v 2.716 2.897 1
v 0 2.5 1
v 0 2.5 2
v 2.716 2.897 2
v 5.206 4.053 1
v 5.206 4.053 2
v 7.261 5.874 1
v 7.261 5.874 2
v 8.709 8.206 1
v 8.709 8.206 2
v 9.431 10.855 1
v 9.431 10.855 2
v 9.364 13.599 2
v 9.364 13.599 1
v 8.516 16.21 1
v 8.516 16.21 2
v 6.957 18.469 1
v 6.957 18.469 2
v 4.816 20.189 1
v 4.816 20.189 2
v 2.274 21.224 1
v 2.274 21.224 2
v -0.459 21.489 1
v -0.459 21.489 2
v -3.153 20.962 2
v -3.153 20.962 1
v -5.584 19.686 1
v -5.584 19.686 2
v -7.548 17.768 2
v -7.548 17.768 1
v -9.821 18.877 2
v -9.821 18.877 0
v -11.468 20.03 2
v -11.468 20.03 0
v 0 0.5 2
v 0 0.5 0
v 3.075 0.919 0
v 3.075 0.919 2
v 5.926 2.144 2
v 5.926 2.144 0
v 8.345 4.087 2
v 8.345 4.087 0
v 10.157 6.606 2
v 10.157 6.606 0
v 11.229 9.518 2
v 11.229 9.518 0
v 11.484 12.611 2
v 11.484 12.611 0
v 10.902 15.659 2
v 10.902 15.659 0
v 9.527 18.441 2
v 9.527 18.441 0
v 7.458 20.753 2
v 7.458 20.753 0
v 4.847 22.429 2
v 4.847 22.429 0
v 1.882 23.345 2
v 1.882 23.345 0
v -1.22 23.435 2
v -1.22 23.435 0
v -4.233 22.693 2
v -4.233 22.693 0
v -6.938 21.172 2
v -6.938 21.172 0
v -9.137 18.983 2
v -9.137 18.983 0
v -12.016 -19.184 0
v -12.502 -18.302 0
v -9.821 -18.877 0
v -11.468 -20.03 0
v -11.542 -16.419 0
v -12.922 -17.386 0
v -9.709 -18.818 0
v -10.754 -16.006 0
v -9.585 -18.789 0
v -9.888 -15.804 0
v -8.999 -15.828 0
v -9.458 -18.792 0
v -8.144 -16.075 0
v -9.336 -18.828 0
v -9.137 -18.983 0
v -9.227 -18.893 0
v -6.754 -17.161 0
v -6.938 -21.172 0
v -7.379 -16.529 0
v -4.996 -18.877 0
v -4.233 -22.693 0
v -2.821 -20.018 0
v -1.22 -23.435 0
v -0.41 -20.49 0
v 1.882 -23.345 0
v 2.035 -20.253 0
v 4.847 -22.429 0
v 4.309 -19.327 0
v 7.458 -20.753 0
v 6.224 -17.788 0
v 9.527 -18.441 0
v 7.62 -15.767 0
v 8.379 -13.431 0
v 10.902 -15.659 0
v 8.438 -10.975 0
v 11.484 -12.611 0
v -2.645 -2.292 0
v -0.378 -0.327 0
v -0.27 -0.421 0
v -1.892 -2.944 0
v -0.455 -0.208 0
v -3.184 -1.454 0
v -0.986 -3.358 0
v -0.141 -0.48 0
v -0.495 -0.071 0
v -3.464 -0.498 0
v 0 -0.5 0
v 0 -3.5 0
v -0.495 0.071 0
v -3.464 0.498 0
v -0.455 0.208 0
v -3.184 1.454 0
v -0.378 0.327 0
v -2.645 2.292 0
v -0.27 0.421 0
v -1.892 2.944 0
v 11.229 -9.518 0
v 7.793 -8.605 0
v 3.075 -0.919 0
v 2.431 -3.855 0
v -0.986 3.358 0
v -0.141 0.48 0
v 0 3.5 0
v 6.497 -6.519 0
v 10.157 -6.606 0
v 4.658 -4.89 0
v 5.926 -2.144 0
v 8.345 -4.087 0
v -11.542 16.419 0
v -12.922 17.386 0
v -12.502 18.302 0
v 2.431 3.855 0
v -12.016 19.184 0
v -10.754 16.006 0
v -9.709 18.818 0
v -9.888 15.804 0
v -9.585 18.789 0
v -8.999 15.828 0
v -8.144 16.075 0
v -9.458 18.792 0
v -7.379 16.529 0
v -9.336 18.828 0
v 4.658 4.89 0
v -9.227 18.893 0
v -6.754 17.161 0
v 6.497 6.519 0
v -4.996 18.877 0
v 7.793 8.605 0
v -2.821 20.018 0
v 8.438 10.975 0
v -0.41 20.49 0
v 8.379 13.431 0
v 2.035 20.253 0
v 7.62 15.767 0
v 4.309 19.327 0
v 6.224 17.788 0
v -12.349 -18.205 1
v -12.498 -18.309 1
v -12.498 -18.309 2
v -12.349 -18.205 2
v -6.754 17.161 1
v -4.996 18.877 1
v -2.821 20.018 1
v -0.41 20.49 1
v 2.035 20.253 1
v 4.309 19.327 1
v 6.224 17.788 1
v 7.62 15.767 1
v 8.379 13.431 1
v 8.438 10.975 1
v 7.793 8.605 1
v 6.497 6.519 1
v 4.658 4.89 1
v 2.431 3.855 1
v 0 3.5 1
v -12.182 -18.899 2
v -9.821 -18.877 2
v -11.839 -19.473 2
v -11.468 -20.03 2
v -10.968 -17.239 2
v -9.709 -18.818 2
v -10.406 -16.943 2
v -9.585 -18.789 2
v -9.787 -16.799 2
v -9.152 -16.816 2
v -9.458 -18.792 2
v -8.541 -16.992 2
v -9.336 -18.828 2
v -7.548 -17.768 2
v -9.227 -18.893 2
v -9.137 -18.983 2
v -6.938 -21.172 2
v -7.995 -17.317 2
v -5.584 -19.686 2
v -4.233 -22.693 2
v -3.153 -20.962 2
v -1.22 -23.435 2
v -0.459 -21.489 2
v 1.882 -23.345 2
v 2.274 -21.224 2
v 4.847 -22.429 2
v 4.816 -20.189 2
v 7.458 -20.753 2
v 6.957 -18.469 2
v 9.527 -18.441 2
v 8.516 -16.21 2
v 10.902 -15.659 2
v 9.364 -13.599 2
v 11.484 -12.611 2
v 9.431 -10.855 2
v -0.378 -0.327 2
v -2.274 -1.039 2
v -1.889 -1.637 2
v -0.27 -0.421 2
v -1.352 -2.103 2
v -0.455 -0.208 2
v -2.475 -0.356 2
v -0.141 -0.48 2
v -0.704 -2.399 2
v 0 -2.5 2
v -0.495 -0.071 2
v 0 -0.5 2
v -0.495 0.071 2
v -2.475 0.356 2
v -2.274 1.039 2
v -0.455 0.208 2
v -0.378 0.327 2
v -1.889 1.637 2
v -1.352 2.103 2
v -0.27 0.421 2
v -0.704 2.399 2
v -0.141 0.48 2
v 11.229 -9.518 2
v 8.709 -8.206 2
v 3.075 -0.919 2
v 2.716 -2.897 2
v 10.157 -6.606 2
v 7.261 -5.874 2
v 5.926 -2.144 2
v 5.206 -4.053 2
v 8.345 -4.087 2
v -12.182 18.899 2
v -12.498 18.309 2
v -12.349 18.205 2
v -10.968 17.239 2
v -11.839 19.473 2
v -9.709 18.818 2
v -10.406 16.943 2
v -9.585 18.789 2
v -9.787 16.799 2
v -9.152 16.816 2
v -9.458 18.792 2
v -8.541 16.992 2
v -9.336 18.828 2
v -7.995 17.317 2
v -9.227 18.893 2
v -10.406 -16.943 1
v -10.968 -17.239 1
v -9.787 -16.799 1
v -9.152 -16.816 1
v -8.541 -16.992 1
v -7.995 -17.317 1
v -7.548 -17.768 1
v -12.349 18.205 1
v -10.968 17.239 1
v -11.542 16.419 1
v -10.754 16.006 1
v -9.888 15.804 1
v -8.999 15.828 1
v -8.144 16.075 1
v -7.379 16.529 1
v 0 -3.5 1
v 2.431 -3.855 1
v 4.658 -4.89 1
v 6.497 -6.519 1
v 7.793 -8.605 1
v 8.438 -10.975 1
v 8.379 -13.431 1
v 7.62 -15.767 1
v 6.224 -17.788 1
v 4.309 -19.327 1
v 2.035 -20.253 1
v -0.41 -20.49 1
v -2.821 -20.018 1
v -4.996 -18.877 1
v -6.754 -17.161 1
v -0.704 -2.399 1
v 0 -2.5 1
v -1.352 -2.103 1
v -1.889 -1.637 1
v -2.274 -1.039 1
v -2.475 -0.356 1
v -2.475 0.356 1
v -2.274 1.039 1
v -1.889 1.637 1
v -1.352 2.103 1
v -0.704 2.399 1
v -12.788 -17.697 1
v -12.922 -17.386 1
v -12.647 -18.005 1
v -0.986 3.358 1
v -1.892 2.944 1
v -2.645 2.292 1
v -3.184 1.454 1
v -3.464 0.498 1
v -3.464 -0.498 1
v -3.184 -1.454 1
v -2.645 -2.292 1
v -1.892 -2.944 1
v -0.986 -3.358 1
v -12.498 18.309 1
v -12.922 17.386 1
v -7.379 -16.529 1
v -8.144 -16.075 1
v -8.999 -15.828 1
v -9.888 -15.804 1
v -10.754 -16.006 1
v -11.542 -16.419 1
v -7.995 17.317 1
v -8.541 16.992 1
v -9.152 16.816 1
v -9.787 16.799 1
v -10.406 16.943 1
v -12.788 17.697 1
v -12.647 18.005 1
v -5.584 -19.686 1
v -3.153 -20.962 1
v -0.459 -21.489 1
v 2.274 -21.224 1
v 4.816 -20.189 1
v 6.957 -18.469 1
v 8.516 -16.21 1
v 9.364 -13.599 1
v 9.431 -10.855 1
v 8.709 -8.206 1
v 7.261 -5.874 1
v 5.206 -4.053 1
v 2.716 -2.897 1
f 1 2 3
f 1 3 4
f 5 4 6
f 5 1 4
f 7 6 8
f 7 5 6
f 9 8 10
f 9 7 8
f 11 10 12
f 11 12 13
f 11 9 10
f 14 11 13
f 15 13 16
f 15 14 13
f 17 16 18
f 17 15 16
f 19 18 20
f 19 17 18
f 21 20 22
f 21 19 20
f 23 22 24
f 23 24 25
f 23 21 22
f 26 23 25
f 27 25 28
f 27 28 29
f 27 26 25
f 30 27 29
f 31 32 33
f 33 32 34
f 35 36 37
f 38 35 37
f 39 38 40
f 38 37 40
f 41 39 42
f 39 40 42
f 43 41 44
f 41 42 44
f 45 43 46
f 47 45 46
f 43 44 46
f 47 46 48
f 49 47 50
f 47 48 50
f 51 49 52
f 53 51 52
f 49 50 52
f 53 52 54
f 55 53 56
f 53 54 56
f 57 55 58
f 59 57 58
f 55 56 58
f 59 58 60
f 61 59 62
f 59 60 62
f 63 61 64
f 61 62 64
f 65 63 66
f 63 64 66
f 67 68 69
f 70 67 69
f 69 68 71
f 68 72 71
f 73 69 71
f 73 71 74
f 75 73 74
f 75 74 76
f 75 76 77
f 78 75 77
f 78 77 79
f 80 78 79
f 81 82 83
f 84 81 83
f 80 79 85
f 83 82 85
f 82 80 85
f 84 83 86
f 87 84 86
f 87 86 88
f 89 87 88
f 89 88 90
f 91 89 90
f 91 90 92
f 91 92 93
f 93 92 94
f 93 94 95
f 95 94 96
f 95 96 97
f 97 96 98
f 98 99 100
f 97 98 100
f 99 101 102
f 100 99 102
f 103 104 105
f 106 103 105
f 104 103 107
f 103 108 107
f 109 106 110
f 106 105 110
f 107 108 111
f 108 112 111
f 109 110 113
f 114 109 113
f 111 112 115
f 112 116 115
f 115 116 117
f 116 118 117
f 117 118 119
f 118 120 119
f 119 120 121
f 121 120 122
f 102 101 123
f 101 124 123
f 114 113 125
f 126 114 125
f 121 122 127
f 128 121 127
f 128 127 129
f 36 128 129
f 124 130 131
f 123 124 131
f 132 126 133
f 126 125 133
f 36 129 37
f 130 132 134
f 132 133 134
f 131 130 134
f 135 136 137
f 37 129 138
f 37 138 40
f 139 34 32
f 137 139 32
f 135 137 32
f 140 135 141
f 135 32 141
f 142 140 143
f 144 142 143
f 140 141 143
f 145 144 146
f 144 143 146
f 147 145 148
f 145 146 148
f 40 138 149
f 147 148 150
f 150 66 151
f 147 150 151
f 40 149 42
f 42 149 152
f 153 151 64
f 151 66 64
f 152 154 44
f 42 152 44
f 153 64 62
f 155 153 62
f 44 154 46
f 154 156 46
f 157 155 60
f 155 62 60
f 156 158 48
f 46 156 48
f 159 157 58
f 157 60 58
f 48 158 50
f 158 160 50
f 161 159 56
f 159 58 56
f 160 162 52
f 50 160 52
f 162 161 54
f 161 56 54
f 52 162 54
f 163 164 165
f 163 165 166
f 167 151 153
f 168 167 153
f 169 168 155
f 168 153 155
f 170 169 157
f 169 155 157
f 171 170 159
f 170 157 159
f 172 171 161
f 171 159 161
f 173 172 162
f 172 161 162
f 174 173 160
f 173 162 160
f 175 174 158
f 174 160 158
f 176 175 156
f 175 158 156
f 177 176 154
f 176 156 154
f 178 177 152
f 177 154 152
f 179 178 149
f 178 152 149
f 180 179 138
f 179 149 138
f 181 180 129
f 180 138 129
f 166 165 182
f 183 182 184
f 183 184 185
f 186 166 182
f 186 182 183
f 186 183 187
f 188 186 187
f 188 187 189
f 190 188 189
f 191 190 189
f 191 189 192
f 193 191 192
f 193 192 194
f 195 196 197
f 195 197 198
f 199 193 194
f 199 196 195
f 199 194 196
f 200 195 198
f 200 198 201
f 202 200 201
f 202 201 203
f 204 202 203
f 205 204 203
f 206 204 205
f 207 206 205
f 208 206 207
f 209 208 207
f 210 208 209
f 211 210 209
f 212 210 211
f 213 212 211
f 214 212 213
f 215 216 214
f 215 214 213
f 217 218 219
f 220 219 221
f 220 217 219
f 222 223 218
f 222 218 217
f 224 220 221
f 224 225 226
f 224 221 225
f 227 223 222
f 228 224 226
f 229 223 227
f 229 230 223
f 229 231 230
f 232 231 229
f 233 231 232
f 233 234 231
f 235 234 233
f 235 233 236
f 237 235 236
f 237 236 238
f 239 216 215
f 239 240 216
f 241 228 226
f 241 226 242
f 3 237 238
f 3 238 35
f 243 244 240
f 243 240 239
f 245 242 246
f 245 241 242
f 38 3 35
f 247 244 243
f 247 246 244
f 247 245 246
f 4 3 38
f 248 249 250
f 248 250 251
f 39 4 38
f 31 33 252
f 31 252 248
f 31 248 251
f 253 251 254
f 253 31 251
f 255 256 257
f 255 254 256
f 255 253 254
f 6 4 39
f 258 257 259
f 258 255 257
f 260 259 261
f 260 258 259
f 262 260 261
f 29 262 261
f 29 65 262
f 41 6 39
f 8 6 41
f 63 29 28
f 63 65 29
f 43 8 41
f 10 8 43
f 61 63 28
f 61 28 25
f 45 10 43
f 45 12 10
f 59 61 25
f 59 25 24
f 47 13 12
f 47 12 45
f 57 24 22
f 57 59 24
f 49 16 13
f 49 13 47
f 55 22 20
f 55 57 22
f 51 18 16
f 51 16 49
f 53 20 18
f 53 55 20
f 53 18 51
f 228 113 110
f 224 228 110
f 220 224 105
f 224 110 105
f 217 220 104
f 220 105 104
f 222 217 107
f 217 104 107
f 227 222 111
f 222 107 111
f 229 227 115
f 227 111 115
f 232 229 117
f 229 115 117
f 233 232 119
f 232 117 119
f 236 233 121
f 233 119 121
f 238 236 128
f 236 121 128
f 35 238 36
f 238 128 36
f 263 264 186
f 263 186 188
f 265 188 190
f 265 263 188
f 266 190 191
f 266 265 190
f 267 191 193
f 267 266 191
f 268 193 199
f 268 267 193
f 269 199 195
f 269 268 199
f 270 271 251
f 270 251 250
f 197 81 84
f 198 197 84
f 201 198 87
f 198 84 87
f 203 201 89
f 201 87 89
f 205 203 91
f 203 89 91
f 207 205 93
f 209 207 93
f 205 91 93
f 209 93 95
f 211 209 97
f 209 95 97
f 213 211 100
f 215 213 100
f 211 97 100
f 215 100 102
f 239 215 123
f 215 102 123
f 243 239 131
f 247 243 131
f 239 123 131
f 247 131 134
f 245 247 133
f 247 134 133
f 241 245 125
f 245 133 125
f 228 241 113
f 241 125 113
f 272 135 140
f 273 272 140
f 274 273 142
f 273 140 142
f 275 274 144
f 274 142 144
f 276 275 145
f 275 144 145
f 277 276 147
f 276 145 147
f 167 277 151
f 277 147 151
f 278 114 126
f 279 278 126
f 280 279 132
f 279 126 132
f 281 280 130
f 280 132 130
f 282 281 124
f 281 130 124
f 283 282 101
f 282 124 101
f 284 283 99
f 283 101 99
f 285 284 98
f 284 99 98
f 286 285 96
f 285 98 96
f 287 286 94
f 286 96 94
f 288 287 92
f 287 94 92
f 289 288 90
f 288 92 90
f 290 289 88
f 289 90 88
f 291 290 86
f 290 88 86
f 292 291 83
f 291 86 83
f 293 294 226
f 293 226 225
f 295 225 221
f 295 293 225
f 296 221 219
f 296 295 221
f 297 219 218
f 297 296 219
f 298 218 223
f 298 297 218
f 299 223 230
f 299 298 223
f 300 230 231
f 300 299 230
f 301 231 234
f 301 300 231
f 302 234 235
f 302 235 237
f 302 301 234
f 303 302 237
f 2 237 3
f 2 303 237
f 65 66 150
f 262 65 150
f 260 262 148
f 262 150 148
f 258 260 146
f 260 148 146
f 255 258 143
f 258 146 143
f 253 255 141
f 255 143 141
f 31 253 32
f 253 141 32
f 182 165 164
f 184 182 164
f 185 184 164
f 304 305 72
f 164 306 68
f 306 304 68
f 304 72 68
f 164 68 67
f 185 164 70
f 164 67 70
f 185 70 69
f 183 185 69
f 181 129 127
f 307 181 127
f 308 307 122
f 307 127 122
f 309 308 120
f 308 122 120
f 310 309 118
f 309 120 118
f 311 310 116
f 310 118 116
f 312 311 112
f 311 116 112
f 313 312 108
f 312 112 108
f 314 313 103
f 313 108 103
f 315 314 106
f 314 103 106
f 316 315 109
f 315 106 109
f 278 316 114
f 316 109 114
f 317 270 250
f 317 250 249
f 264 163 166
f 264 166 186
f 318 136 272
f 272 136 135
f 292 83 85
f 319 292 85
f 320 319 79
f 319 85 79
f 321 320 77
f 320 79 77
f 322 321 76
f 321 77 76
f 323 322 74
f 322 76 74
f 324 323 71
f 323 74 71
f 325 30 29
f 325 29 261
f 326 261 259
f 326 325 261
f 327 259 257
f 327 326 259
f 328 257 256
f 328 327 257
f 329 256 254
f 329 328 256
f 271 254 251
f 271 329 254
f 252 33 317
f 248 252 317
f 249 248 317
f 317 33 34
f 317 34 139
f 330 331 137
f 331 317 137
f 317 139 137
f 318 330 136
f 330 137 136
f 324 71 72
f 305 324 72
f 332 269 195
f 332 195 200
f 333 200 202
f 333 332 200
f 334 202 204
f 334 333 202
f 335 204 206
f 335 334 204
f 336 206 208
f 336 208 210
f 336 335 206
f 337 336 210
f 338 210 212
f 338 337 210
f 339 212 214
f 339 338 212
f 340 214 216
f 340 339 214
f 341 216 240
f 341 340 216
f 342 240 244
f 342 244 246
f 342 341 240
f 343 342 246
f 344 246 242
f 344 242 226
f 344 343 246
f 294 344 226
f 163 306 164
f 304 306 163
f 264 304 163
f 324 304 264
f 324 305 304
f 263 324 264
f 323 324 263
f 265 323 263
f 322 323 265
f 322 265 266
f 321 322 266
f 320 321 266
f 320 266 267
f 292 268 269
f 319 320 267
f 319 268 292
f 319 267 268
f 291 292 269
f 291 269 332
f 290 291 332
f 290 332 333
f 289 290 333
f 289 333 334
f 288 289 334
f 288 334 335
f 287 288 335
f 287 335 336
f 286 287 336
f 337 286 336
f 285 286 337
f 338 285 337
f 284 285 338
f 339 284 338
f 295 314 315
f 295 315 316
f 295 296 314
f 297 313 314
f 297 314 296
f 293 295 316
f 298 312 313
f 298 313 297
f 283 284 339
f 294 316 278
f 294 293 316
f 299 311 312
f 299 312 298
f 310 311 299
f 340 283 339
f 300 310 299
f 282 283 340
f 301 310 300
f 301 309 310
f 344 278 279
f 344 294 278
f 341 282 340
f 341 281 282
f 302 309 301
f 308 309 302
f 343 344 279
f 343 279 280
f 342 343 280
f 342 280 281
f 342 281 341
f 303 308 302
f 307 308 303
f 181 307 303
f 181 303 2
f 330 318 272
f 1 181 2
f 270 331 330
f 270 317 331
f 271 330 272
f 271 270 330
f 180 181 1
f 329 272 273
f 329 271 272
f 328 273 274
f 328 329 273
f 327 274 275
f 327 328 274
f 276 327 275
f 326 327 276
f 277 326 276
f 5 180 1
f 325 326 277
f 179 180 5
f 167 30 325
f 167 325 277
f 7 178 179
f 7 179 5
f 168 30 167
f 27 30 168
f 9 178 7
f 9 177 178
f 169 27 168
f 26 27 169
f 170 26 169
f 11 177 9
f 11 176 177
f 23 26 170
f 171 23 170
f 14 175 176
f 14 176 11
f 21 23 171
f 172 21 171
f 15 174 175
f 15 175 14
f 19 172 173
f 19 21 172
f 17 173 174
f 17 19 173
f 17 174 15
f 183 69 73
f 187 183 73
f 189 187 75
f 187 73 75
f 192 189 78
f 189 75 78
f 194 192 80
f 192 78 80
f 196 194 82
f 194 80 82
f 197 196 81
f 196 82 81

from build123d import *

# Parameters (mm, degrees)
BOSS_EXTRU_2_DEPTH      = 2
ENL_V_START             = -1
ENL_V_MAT_EXTRU_1_DEPTH = 1


with BuildPart() as part:
    # Esquisse1 → Boss.-Extru.2 (new body)
    with BuildSketch(Plane.XY):
        with BuildLine():
            Line((-12.922465041, 17.386083667), (-11.5420173, 16.419483753))
            ThreePointArc((-11.5420173, 16.419483753), (-8.998687611, 15.827772592), (-6.753604006, 17.161282102))
            ThreePointArc((-6.753604006, 17.161282102), (7.619740739, 15.766902052), (0, 3.5))
            ThreePointArc((0, 3.5), (-3.5, 0), (0, -3.5))
            ThreePointArc((0, -3.5), (7.619740739, -15.766902052), (-6.753604006, -17.161282102))
            ThreePointArc((-6.753604006, -17.161282102), (-8.998687611, -15.827772592), (-11.5420173, -16.419483753))
            Line((-11.5420173, -16.419483753), (-12.922465041, -17.386083667))
            ThreePointArc((-12.922465041, -17.386083667), (-12.266740841, -18.747374982), (-11.46812862, -20.030070109))
            Line((-11.46812862, -20.030070109), (-9.821287991, -18.876939886))
            ThreePointArc((-9.821287991, -18.876939886), (-9.457955178, -18.79240972), (-9.137228949, -18.982911079))
            ThreePointArc((-9.137228949, -18.982911079), (10.309061, -17.096396894), (0, -0.5))
            ThreePointArc((0, -0.5), (-0.5, 0), (0, 0.5))
            ThreePointArc((0, 0.5), (10.309061, 17.096396894), (-9.137228949, 18.982911079))
            ThreePointArc((-9.137228949, 18.982911079), (-9.457955178, 18.79240972), (-9.821287991, 18.876939886))
            Line((-9.821287991, 18.876939886), (-11.46812862, 20.030070109))
            ThreePointArc((-11.46812862, 20.030070109), (-12.266740841, 18.747374982), (-12.922465041, 17.386083667))
        make_face()
    extrude(amount=BOSS_EXTRU_2_DEPTH)

    # Esquisse2 → Enlèv. mat.-Extru.1 (cut)
    with BuildSketch(Plane.XY.offset(2).offset(ENL_V_START)):
        with BuildLine():
            Line((-12.922465041, 17.386083667), (-11.5420173, 16.419483753))
            ThreePointArc((-11.5420173, 16.419483753), (-8.998687611, 15.827772592), (-6.753604006, 17.161282102))
            ThreePointArc((-6.753604006, 17.161282102), (7.619740739, 15.766902052), (0, 3.5))
            ThreePointArc((0, 3.5), (-3.5, 0), (0, -3.5))
            ThreePointArc((0, -3.5), (7.619740739, -15.766902052), (-6.753604006, -17.161282102))
            ThreePointArc((-6.753604006, -17.161282102), (-8.998687611, -15.827772592), (-11.5420173, -16.419483753))
            Line((-11.5420173, -16.419483753), (-12.922465041, -17.386083667))
            Line((-12.922465041, -17.386083667), (-12.979954825, -18.647113037))
            Line((-12.979954825, -18.647113037), (-12.348888604, -18.205235712))
            Line((-12.348888604, -18.205235712), (-10.968440864, -17.238635798))
            ThreePointArc((-10.968440864, -17.238635798), (-9.1517768, -16.815984968), (-7.548145653, -17.768491761))
            ThreePointArc((-7.548145653, -17.768491761), (8.516180826, -16.210066999), (0, -2.5))
            ThreePointArc((0, -2.5), (-2.5, 0), (0, 2.5))
            ThreePointArc((0, 2.5), (8.516180826, 16.210066999), (-7.548145653, 17.768491761))
            ThreePointArc((-7.548145653, 17.768491761), (-9.1517768, 16.815984968), (-10.968440864, 17.238635798))
            Line((-10.968440864, 17.238635798), (-12.348888604, 18.205235712))
            Line((-12.348888604, 18.205235712), (-12.898926694, 18.590376529))
            Line((-12.898926694, 18.590376529), (-13.29562882, 18.205235712))
            Line((-13.29562882, 18.205235712), (-12.922465041, 17.386083667))
        make_face()
    extrude(amount=ENL_V_MAT_EXTRU_1_DEPTH, mode=Mode.SUBTRACT)


solid = part.part
